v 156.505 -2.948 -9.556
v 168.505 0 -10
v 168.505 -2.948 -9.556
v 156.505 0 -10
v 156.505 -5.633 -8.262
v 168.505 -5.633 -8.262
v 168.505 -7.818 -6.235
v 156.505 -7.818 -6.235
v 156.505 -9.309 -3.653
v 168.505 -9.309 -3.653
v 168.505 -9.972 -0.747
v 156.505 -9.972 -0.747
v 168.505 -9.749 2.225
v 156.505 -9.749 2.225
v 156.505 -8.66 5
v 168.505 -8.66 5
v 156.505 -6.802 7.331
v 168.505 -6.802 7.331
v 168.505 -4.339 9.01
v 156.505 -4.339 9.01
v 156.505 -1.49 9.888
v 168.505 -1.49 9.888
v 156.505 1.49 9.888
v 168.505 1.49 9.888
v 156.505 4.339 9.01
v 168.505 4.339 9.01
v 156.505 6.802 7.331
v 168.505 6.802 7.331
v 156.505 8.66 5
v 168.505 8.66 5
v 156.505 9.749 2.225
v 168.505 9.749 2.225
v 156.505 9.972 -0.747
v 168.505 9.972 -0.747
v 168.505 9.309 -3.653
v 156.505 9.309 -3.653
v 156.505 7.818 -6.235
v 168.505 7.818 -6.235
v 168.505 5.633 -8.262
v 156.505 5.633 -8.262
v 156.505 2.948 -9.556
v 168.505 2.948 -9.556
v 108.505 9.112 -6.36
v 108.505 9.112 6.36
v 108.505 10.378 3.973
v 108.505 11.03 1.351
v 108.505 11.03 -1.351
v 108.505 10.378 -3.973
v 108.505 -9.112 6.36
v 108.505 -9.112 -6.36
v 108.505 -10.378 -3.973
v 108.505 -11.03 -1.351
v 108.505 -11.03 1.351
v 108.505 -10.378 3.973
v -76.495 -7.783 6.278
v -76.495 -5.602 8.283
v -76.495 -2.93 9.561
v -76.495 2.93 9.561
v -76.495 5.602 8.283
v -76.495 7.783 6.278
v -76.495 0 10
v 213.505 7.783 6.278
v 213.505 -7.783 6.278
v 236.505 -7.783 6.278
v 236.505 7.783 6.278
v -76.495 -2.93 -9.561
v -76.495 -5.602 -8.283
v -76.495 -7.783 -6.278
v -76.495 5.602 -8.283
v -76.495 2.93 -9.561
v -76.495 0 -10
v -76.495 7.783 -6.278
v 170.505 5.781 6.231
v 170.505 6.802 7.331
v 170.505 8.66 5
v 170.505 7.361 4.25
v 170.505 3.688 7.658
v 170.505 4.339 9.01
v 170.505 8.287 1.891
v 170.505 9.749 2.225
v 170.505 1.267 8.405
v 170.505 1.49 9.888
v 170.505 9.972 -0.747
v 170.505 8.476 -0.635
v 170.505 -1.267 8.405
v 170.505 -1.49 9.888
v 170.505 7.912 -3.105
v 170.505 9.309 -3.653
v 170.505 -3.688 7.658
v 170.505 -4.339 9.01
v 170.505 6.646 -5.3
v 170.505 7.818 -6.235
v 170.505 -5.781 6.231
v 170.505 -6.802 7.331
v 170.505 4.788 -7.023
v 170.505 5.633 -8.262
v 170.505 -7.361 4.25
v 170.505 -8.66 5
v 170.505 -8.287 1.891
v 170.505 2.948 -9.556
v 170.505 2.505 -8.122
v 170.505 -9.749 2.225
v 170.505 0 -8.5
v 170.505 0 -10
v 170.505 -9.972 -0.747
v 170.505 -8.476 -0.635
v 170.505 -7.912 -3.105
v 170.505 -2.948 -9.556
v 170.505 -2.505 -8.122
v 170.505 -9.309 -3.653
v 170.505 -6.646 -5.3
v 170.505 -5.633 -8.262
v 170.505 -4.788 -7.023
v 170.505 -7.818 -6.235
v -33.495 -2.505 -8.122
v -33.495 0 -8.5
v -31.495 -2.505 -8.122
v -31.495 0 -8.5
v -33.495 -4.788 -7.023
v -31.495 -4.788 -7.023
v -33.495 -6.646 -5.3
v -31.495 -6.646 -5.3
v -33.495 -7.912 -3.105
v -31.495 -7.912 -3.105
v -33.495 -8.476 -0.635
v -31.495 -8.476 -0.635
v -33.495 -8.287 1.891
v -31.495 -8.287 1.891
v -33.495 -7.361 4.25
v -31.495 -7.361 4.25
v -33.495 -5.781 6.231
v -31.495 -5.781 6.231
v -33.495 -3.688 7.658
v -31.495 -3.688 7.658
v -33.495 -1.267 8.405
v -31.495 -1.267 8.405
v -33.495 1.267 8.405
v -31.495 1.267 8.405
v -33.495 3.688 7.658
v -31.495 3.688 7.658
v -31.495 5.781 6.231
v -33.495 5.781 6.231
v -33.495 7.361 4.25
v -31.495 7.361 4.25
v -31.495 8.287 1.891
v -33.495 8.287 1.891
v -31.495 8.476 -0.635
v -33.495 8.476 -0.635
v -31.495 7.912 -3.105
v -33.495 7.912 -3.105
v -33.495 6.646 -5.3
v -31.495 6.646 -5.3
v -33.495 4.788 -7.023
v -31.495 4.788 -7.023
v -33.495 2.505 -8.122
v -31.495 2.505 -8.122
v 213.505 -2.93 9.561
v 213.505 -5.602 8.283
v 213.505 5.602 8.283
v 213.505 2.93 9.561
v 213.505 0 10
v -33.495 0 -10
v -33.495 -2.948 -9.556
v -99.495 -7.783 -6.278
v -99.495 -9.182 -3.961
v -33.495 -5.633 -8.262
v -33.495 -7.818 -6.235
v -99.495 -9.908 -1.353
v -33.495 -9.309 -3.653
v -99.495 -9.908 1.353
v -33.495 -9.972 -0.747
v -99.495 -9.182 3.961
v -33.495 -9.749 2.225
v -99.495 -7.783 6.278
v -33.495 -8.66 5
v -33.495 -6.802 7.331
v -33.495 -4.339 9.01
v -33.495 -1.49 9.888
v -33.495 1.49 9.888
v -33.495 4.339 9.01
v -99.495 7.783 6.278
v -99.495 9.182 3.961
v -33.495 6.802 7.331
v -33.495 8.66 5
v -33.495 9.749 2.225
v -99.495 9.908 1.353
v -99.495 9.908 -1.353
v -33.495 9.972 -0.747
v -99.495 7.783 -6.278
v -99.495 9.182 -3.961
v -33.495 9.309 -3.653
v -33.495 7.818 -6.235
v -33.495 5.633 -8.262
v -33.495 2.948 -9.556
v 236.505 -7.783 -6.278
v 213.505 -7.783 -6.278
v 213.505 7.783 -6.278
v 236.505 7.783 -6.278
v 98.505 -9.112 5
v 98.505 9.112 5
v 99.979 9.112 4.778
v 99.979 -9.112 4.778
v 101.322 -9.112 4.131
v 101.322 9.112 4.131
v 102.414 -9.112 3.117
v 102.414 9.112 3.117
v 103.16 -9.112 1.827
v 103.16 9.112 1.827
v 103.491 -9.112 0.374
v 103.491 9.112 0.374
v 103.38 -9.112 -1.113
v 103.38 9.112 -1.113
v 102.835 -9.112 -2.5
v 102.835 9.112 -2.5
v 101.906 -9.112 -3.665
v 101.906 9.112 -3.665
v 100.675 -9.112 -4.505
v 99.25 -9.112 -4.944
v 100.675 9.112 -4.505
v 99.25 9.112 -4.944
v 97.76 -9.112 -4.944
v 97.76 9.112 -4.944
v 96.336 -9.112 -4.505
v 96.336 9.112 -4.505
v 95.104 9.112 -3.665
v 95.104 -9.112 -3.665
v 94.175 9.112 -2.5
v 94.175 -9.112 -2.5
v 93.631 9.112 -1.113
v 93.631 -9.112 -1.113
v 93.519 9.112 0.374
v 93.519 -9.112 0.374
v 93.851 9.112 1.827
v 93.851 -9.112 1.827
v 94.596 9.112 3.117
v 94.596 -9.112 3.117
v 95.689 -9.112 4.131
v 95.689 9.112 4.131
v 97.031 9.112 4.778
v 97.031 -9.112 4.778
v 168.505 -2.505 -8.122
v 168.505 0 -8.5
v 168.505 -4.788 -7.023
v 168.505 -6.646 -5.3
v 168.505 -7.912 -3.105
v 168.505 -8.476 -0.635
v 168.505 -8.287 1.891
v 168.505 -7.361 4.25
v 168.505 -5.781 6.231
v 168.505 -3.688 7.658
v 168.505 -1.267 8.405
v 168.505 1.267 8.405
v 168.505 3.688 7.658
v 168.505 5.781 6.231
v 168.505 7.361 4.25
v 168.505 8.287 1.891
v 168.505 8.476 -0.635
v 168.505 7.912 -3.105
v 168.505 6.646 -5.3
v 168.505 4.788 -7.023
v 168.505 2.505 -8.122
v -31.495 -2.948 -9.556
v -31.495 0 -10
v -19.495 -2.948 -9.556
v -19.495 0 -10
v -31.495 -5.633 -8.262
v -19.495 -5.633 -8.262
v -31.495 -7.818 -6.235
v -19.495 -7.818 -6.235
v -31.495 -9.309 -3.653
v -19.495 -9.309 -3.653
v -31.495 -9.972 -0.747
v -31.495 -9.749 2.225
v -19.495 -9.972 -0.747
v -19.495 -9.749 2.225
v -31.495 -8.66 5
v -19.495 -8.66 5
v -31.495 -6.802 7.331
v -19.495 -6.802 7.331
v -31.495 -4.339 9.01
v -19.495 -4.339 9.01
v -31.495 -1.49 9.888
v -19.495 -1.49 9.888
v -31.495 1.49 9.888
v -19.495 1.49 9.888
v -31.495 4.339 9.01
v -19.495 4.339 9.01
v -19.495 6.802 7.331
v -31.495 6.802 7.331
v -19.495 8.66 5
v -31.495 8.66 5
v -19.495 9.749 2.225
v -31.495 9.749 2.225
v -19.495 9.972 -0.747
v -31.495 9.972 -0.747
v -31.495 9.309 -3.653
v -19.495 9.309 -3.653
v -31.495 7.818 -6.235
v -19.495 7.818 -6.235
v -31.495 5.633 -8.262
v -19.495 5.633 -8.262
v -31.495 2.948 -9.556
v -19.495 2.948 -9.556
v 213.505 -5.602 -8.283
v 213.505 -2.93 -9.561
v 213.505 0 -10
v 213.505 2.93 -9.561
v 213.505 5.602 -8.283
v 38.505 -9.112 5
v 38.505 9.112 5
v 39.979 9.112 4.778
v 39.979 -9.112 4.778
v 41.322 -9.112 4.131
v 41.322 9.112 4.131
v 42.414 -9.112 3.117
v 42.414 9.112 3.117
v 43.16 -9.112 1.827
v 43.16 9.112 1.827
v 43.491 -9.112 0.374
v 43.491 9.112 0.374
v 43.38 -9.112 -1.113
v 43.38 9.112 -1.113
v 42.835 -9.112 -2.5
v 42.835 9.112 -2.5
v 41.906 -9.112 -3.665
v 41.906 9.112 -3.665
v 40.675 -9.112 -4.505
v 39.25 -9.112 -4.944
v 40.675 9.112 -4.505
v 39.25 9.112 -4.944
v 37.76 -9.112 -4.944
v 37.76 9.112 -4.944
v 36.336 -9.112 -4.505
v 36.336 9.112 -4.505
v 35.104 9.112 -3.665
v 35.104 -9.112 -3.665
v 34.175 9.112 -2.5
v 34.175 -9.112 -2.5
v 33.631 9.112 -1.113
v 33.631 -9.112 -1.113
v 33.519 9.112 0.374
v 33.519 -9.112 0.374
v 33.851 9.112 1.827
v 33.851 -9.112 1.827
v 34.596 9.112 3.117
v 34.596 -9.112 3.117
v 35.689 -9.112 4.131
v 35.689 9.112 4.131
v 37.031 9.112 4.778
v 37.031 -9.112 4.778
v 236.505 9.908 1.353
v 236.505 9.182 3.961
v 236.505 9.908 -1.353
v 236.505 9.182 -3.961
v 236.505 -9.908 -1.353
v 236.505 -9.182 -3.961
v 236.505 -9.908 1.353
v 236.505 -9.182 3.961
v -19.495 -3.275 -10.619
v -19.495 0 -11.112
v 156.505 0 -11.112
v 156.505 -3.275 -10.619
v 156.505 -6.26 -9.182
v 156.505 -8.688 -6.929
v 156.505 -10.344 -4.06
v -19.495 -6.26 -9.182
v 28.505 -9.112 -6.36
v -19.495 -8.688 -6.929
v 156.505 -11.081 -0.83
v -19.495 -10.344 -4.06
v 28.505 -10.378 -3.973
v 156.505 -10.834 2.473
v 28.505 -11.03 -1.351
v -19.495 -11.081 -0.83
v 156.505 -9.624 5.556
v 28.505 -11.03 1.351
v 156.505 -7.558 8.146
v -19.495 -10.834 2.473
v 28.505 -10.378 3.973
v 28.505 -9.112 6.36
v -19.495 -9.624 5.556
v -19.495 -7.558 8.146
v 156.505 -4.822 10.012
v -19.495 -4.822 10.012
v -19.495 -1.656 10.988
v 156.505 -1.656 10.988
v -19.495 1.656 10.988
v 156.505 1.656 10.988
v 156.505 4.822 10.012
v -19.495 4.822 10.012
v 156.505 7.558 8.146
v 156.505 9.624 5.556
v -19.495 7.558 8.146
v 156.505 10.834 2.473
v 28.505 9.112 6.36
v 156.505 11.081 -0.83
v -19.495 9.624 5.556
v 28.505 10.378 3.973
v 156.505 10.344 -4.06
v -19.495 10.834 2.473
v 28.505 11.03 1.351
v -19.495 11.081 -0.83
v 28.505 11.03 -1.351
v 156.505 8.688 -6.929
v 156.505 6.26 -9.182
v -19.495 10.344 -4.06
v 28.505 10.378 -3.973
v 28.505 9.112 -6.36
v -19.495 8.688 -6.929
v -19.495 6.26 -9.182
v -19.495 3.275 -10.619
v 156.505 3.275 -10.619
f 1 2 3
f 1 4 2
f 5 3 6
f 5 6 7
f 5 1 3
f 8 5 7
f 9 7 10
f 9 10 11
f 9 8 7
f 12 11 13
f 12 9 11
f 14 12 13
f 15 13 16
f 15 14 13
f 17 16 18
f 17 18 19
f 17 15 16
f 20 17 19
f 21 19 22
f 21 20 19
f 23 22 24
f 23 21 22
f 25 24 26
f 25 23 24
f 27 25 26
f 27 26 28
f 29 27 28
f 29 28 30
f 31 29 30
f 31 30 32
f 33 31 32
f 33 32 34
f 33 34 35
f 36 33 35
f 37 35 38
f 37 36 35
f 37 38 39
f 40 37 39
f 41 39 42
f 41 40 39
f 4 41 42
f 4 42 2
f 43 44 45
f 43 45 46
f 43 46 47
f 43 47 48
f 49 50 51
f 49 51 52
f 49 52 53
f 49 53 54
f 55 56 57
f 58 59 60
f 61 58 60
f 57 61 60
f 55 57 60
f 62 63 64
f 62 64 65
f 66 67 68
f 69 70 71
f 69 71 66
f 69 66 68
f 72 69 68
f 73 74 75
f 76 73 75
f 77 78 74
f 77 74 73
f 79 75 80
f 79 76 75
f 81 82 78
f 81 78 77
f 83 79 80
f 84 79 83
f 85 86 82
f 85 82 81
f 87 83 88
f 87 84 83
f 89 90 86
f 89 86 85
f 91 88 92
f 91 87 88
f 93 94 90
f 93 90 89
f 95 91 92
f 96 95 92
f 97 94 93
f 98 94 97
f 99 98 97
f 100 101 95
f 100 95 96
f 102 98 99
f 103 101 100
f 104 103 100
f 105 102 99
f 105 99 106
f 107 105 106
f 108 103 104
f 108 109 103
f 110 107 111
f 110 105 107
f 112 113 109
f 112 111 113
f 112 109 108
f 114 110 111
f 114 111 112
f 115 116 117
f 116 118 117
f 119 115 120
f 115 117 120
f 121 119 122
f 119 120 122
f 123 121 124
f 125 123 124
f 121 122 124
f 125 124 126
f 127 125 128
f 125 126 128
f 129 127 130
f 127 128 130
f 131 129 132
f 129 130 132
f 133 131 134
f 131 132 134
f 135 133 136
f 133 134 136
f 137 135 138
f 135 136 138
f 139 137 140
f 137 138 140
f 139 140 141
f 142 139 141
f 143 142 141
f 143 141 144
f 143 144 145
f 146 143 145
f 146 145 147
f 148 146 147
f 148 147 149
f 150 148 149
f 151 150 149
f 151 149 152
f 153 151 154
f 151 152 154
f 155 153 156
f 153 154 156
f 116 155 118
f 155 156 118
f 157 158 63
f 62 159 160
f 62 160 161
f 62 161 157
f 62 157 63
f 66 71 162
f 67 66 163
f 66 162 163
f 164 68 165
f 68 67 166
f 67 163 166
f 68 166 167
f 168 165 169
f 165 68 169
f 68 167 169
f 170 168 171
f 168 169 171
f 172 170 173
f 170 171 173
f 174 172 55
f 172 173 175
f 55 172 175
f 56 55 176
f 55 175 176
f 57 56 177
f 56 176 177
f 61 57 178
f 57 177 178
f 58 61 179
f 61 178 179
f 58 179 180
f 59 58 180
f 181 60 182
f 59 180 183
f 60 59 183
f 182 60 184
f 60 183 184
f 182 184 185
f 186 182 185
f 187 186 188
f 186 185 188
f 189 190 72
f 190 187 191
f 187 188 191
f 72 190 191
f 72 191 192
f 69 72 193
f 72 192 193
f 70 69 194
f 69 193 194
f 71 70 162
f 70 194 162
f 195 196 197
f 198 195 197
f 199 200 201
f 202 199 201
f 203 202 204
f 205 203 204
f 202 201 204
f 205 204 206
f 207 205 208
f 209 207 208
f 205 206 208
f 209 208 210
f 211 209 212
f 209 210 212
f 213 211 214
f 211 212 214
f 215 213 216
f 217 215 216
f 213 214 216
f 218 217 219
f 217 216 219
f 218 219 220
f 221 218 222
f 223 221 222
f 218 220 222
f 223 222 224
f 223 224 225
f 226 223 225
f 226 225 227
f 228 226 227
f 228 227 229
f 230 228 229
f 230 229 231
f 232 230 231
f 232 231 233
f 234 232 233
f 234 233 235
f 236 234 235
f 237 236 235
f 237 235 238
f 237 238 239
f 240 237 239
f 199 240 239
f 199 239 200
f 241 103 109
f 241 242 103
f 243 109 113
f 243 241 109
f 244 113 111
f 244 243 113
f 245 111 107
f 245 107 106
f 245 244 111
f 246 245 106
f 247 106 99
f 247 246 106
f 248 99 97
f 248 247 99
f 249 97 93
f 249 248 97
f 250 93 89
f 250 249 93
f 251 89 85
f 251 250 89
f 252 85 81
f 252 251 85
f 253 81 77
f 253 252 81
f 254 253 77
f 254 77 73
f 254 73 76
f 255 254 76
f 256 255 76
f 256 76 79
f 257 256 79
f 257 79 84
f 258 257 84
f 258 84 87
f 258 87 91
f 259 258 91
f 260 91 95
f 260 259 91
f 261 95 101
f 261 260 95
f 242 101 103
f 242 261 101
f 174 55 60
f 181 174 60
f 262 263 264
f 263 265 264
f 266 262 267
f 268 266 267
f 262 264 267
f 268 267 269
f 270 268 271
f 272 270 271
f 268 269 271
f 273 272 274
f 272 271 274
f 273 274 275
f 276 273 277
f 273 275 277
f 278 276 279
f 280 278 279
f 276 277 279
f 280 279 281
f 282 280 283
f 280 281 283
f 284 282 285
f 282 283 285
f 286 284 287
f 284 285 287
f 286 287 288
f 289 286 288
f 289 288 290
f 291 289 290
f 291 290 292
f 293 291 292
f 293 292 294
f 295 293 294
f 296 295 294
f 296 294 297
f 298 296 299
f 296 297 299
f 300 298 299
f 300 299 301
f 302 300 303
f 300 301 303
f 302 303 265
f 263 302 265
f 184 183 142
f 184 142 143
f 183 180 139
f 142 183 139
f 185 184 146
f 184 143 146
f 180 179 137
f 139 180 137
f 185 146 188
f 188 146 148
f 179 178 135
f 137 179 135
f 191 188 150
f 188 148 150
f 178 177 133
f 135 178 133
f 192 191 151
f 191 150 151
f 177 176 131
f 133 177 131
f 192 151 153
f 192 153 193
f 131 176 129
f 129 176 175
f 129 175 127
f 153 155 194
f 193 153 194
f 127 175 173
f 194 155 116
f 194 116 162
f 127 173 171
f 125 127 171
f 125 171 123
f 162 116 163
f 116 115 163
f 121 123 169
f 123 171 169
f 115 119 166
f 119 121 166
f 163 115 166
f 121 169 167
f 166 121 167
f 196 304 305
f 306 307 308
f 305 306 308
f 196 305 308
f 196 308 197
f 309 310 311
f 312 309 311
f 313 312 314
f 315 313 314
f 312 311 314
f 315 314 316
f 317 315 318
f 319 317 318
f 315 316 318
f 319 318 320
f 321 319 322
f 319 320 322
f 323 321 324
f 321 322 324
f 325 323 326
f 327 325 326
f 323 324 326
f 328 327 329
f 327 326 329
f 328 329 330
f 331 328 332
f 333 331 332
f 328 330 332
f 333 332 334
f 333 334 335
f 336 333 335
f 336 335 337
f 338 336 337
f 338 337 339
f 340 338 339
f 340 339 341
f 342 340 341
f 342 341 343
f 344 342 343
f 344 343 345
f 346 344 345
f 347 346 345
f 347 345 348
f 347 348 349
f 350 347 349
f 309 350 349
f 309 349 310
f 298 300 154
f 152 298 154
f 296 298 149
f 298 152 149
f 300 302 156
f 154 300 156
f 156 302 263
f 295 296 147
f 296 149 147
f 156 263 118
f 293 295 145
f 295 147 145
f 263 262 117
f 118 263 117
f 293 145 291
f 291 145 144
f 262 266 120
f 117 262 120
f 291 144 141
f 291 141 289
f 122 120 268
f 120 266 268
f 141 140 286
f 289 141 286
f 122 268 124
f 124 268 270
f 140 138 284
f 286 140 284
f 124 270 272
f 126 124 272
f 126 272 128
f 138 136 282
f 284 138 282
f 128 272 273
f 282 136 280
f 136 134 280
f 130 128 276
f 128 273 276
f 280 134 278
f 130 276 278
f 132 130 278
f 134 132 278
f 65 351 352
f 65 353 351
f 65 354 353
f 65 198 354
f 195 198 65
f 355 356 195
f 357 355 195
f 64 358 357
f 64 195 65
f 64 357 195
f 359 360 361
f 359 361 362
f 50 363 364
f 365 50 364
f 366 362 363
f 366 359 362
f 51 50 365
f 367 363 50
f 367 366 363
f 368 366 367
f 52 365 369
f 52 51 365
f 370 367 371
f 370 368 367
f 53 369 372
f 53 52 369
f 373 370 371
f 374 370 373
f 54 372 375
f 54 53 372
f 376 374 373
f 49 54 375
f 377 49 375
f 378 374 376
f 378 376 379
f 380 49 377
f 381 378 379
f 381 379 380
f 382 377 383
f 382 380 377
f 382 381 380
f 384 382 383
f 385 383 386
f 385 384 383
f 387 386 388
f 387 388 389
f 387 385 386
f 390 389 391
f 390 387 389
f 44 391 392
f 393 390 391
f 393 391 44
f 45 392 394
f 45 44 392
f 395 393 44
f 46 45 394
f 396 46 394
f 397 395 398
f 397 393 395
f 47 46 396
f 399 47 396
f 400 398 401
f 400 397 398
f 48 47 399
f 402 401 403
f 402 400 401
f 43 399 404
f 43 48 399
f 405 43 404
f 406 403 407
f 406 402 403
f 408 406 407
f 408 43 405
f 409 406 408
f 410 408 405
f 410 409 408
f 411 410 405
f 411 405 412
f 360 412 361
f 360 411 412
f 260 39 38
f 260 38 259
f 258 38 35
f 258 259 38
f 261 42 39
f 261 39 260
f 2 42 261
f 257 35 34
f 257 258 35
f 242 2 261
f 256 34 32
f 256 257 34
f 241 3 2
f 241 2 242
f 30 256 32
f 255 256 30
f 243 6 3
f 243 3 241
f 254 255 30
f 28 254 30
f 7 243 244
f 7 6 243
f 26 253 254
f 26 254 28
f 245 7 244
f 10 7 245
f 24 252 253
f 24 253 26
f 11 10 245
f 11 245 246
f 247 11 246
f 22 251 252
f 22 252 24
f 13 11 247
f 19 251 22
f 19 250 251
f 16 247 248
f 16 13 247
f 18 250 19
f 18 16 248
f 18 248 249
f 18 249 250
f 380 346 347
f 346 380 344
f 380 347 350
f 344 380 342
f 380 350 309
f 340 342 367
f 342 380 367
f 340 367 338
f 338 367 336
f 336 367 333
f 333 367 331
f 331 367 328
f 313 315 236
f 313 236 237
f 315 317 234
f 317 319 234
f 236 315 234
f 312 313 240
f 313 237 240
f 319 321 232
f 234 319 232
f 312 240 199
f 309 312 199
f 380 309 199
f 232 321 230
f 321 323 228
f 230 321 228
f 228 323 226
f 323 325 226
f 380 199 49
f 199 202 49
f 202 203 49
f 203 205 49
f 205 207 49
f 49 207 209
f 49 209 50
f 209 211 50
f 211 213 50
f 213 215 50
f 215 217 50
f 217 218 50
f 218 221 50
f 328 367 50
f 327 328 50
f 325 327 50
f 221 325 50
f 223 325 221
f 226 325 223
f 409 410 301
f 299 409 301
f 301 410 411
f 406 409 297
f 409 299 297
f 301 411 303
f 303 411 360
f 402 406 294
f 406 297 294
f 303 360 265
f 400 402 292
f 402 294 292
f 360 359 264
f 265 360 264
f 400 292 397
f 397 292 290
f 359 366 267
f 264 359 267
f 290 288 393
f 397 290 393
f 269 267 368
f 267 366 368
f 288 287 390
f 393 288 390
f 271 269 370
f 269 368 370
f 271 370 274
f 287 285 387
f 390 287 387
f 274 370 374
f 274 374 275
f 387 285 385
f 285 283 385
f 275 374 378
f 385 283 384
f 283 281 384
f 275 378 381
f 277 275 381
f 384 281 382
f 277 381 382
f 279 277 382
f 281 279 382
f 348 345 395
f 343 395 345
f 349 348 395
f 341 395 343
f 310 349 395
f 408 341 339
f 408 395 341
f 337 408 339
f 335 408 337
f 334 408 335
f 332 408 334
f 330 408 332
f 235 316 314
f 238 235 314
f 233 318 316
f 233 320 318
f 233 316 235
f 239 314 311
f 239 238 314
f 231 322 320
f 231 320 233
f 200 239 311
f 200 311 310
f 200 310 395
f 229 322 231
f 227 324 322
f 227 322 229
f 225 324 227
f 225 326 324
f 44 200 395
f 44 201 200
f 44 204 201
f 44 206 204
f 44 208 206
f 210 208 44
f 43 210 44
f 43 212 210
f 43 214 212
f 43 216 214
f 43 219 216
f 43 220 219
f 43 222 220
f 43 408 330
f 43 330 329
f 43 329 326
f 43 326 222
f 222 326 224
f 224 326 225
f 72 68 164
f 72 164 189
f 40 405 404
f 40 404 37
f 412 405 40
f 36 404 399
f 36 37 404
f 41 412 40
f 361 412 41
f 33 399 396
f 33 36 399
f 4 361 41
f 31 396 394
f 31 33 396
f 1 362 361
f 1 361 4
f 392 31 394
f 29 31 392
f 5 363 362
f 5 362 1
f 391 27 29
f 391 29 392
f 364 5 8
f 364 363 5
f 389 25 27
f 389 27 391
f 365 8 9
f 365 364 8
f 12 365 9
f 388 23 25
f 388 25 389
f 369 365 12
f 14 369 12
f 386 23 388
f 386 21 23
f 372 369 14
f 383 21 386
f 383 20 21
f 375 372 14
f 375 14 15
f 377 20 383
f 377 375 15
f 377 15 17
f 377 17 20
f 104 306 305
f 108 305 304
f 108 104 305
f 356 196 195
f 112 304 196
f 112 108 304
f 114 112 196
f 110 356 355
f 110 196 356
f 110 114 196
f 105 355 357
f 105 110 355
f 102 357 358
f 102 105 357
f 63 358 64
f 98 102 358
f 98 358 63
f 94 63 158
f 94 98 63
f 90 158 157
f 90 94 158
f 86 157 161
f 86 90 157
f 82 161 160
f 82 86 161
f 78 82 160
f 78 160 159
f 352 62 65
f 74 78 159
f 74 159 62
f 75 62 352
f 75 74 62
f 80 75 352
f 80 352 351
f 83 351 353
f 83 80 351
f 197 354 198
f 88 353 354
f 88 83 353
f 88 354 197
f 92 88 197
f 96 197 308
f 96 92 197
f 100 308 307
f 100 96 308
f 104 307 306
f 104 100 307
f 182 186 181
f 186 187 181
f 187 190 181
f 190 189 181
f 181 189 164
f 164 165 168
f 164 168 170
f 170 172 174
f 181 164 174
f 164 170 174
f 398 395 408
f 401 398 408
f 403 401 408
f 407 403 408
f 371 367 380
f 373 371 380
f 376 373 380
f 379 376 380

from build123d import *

# Parameters (mm, degrees)
CORTAR_EXTRUIR1_START      = -23
CORTAR_EXTRUIR1_DEPTH      = 23
CORTAR_EXTRUIR2_DEPTH      = 238.026751177
CORTAR_EXTRUIR2_DEPTH_BACK = 238.026751177
CROQUIS3_W                 = 80
CROQUIS3_H                 = 4
CROQUIS4_R                 = 5
CORTAR_EXTRUIR3_DEPTH      = 238.628373184


with BuildPart() as part:
    # Croquis1 → Revolución1 (revolve)
    with BuildSketch(Plane.XY, mode=Mode.PRIVATE) as revoluci_n1_sk:
        Polygon((-19.494808808, 11.1125), (68.505191192, 11.1125), (68.505191192, 0), (-99.494808808, 0), (-99.494808808, 10), (-33.494808808, 10), (-33.494808808, 8.5), (-31.494808808, 8.5), (-31.494808808, 10), (-19.494808808, 10), align=None)
    revoluci_n1 = revolve(revoluci_n1_sk.sketch.rotate(Axis((70.414965315, 0, 0), (-1, 0, 0)), 90), axis=Axis((70.414965315, 0, 0), (-1, 0, 0)))

    # Croquis2 → Cortar-Extruir1 (cut)
    with BuildSketch(Plane.ZY.offset(99.494808808).offset(CORTAR_EXTRUIR1_START)):
        with BuildLine():
            Line((-6.278365003, -7.783452504), (-6.278365003, 7.783452504))
            ThreePointArc((-6.278365003, 7.783452504), (-10, 0), (-6.278365003, -7.783452504))
        make_face()
        with BuildLine():
            Line((6.278365003, -7.783452504), (6.278365003, 7.783452504))
            ThreePointArc((6.278365003, 7.783452504), (10, 0), (6.278365003, -7.783452504))
        make_face()
    cortar_extruir1 = extrude(amount=CORTAR_EXTRUIR1_DEPTH, mode=Mode.SUBTRACT)

    # Simetría2: Revolución1, Cortar-Extruir1 across plane
    add(revoluci_n1.mirror(Plane(origin=(68.505191192, 11.1125, 0), x_dir=(0, 0, 1), z_dir=(1, 0, 0))))
    add(cortar_extruir1.mirror(Plane(origin=(68.505191192, 11.1125, 0), x_dir=(0, 0, 1), z_dir=(1, 0, 0))), mode=Mode.SUBTRACT)

    # Croquis3 → Cortar-Extruir2 (cut, two sides: drawn at the far end of the back side and taken through both)
    with BuildSketch(Plane.XY.offset(-CORTAR_EXTRUIR2_DEPTH_BACK)):
        with Locations((68.505191192, 11.1125)):
            Rectangle(CROQUIS3_W, CROQUIS3_H)
        with Locations((68.505191192, -11.1125)):
            Rectangle(CROQUIS3_W, CROQUIS3_H)
    extrude(amount=CORTAR_EXTRUIR2_DEPTH + CORTAR_EXTRUIR2_DEPTH_BACK, mode=Mode.SUBTRACT)

    # Croquis4 → Cortar-Extruir3 (cut, through all)
    with BuildSketch(Plane(origin=(0, 9.1125, 0), x_dir=(1, 0, 0), z_dir=(0, 1, 0))):
        with Locations(Location((38.505191192, 0, 0), (0, 0, 270))):
            Circle(CROQUIS4_R)
        with Locations(Location((98.505191192, 0, 0), (0, 0, 270))):
            Circle(CROQUIS4_R)
    extrude(amount=-CORTAR_EXTRUIR3_DEPTH, mode=Mode.SUBTRACT)


solid = part.part
